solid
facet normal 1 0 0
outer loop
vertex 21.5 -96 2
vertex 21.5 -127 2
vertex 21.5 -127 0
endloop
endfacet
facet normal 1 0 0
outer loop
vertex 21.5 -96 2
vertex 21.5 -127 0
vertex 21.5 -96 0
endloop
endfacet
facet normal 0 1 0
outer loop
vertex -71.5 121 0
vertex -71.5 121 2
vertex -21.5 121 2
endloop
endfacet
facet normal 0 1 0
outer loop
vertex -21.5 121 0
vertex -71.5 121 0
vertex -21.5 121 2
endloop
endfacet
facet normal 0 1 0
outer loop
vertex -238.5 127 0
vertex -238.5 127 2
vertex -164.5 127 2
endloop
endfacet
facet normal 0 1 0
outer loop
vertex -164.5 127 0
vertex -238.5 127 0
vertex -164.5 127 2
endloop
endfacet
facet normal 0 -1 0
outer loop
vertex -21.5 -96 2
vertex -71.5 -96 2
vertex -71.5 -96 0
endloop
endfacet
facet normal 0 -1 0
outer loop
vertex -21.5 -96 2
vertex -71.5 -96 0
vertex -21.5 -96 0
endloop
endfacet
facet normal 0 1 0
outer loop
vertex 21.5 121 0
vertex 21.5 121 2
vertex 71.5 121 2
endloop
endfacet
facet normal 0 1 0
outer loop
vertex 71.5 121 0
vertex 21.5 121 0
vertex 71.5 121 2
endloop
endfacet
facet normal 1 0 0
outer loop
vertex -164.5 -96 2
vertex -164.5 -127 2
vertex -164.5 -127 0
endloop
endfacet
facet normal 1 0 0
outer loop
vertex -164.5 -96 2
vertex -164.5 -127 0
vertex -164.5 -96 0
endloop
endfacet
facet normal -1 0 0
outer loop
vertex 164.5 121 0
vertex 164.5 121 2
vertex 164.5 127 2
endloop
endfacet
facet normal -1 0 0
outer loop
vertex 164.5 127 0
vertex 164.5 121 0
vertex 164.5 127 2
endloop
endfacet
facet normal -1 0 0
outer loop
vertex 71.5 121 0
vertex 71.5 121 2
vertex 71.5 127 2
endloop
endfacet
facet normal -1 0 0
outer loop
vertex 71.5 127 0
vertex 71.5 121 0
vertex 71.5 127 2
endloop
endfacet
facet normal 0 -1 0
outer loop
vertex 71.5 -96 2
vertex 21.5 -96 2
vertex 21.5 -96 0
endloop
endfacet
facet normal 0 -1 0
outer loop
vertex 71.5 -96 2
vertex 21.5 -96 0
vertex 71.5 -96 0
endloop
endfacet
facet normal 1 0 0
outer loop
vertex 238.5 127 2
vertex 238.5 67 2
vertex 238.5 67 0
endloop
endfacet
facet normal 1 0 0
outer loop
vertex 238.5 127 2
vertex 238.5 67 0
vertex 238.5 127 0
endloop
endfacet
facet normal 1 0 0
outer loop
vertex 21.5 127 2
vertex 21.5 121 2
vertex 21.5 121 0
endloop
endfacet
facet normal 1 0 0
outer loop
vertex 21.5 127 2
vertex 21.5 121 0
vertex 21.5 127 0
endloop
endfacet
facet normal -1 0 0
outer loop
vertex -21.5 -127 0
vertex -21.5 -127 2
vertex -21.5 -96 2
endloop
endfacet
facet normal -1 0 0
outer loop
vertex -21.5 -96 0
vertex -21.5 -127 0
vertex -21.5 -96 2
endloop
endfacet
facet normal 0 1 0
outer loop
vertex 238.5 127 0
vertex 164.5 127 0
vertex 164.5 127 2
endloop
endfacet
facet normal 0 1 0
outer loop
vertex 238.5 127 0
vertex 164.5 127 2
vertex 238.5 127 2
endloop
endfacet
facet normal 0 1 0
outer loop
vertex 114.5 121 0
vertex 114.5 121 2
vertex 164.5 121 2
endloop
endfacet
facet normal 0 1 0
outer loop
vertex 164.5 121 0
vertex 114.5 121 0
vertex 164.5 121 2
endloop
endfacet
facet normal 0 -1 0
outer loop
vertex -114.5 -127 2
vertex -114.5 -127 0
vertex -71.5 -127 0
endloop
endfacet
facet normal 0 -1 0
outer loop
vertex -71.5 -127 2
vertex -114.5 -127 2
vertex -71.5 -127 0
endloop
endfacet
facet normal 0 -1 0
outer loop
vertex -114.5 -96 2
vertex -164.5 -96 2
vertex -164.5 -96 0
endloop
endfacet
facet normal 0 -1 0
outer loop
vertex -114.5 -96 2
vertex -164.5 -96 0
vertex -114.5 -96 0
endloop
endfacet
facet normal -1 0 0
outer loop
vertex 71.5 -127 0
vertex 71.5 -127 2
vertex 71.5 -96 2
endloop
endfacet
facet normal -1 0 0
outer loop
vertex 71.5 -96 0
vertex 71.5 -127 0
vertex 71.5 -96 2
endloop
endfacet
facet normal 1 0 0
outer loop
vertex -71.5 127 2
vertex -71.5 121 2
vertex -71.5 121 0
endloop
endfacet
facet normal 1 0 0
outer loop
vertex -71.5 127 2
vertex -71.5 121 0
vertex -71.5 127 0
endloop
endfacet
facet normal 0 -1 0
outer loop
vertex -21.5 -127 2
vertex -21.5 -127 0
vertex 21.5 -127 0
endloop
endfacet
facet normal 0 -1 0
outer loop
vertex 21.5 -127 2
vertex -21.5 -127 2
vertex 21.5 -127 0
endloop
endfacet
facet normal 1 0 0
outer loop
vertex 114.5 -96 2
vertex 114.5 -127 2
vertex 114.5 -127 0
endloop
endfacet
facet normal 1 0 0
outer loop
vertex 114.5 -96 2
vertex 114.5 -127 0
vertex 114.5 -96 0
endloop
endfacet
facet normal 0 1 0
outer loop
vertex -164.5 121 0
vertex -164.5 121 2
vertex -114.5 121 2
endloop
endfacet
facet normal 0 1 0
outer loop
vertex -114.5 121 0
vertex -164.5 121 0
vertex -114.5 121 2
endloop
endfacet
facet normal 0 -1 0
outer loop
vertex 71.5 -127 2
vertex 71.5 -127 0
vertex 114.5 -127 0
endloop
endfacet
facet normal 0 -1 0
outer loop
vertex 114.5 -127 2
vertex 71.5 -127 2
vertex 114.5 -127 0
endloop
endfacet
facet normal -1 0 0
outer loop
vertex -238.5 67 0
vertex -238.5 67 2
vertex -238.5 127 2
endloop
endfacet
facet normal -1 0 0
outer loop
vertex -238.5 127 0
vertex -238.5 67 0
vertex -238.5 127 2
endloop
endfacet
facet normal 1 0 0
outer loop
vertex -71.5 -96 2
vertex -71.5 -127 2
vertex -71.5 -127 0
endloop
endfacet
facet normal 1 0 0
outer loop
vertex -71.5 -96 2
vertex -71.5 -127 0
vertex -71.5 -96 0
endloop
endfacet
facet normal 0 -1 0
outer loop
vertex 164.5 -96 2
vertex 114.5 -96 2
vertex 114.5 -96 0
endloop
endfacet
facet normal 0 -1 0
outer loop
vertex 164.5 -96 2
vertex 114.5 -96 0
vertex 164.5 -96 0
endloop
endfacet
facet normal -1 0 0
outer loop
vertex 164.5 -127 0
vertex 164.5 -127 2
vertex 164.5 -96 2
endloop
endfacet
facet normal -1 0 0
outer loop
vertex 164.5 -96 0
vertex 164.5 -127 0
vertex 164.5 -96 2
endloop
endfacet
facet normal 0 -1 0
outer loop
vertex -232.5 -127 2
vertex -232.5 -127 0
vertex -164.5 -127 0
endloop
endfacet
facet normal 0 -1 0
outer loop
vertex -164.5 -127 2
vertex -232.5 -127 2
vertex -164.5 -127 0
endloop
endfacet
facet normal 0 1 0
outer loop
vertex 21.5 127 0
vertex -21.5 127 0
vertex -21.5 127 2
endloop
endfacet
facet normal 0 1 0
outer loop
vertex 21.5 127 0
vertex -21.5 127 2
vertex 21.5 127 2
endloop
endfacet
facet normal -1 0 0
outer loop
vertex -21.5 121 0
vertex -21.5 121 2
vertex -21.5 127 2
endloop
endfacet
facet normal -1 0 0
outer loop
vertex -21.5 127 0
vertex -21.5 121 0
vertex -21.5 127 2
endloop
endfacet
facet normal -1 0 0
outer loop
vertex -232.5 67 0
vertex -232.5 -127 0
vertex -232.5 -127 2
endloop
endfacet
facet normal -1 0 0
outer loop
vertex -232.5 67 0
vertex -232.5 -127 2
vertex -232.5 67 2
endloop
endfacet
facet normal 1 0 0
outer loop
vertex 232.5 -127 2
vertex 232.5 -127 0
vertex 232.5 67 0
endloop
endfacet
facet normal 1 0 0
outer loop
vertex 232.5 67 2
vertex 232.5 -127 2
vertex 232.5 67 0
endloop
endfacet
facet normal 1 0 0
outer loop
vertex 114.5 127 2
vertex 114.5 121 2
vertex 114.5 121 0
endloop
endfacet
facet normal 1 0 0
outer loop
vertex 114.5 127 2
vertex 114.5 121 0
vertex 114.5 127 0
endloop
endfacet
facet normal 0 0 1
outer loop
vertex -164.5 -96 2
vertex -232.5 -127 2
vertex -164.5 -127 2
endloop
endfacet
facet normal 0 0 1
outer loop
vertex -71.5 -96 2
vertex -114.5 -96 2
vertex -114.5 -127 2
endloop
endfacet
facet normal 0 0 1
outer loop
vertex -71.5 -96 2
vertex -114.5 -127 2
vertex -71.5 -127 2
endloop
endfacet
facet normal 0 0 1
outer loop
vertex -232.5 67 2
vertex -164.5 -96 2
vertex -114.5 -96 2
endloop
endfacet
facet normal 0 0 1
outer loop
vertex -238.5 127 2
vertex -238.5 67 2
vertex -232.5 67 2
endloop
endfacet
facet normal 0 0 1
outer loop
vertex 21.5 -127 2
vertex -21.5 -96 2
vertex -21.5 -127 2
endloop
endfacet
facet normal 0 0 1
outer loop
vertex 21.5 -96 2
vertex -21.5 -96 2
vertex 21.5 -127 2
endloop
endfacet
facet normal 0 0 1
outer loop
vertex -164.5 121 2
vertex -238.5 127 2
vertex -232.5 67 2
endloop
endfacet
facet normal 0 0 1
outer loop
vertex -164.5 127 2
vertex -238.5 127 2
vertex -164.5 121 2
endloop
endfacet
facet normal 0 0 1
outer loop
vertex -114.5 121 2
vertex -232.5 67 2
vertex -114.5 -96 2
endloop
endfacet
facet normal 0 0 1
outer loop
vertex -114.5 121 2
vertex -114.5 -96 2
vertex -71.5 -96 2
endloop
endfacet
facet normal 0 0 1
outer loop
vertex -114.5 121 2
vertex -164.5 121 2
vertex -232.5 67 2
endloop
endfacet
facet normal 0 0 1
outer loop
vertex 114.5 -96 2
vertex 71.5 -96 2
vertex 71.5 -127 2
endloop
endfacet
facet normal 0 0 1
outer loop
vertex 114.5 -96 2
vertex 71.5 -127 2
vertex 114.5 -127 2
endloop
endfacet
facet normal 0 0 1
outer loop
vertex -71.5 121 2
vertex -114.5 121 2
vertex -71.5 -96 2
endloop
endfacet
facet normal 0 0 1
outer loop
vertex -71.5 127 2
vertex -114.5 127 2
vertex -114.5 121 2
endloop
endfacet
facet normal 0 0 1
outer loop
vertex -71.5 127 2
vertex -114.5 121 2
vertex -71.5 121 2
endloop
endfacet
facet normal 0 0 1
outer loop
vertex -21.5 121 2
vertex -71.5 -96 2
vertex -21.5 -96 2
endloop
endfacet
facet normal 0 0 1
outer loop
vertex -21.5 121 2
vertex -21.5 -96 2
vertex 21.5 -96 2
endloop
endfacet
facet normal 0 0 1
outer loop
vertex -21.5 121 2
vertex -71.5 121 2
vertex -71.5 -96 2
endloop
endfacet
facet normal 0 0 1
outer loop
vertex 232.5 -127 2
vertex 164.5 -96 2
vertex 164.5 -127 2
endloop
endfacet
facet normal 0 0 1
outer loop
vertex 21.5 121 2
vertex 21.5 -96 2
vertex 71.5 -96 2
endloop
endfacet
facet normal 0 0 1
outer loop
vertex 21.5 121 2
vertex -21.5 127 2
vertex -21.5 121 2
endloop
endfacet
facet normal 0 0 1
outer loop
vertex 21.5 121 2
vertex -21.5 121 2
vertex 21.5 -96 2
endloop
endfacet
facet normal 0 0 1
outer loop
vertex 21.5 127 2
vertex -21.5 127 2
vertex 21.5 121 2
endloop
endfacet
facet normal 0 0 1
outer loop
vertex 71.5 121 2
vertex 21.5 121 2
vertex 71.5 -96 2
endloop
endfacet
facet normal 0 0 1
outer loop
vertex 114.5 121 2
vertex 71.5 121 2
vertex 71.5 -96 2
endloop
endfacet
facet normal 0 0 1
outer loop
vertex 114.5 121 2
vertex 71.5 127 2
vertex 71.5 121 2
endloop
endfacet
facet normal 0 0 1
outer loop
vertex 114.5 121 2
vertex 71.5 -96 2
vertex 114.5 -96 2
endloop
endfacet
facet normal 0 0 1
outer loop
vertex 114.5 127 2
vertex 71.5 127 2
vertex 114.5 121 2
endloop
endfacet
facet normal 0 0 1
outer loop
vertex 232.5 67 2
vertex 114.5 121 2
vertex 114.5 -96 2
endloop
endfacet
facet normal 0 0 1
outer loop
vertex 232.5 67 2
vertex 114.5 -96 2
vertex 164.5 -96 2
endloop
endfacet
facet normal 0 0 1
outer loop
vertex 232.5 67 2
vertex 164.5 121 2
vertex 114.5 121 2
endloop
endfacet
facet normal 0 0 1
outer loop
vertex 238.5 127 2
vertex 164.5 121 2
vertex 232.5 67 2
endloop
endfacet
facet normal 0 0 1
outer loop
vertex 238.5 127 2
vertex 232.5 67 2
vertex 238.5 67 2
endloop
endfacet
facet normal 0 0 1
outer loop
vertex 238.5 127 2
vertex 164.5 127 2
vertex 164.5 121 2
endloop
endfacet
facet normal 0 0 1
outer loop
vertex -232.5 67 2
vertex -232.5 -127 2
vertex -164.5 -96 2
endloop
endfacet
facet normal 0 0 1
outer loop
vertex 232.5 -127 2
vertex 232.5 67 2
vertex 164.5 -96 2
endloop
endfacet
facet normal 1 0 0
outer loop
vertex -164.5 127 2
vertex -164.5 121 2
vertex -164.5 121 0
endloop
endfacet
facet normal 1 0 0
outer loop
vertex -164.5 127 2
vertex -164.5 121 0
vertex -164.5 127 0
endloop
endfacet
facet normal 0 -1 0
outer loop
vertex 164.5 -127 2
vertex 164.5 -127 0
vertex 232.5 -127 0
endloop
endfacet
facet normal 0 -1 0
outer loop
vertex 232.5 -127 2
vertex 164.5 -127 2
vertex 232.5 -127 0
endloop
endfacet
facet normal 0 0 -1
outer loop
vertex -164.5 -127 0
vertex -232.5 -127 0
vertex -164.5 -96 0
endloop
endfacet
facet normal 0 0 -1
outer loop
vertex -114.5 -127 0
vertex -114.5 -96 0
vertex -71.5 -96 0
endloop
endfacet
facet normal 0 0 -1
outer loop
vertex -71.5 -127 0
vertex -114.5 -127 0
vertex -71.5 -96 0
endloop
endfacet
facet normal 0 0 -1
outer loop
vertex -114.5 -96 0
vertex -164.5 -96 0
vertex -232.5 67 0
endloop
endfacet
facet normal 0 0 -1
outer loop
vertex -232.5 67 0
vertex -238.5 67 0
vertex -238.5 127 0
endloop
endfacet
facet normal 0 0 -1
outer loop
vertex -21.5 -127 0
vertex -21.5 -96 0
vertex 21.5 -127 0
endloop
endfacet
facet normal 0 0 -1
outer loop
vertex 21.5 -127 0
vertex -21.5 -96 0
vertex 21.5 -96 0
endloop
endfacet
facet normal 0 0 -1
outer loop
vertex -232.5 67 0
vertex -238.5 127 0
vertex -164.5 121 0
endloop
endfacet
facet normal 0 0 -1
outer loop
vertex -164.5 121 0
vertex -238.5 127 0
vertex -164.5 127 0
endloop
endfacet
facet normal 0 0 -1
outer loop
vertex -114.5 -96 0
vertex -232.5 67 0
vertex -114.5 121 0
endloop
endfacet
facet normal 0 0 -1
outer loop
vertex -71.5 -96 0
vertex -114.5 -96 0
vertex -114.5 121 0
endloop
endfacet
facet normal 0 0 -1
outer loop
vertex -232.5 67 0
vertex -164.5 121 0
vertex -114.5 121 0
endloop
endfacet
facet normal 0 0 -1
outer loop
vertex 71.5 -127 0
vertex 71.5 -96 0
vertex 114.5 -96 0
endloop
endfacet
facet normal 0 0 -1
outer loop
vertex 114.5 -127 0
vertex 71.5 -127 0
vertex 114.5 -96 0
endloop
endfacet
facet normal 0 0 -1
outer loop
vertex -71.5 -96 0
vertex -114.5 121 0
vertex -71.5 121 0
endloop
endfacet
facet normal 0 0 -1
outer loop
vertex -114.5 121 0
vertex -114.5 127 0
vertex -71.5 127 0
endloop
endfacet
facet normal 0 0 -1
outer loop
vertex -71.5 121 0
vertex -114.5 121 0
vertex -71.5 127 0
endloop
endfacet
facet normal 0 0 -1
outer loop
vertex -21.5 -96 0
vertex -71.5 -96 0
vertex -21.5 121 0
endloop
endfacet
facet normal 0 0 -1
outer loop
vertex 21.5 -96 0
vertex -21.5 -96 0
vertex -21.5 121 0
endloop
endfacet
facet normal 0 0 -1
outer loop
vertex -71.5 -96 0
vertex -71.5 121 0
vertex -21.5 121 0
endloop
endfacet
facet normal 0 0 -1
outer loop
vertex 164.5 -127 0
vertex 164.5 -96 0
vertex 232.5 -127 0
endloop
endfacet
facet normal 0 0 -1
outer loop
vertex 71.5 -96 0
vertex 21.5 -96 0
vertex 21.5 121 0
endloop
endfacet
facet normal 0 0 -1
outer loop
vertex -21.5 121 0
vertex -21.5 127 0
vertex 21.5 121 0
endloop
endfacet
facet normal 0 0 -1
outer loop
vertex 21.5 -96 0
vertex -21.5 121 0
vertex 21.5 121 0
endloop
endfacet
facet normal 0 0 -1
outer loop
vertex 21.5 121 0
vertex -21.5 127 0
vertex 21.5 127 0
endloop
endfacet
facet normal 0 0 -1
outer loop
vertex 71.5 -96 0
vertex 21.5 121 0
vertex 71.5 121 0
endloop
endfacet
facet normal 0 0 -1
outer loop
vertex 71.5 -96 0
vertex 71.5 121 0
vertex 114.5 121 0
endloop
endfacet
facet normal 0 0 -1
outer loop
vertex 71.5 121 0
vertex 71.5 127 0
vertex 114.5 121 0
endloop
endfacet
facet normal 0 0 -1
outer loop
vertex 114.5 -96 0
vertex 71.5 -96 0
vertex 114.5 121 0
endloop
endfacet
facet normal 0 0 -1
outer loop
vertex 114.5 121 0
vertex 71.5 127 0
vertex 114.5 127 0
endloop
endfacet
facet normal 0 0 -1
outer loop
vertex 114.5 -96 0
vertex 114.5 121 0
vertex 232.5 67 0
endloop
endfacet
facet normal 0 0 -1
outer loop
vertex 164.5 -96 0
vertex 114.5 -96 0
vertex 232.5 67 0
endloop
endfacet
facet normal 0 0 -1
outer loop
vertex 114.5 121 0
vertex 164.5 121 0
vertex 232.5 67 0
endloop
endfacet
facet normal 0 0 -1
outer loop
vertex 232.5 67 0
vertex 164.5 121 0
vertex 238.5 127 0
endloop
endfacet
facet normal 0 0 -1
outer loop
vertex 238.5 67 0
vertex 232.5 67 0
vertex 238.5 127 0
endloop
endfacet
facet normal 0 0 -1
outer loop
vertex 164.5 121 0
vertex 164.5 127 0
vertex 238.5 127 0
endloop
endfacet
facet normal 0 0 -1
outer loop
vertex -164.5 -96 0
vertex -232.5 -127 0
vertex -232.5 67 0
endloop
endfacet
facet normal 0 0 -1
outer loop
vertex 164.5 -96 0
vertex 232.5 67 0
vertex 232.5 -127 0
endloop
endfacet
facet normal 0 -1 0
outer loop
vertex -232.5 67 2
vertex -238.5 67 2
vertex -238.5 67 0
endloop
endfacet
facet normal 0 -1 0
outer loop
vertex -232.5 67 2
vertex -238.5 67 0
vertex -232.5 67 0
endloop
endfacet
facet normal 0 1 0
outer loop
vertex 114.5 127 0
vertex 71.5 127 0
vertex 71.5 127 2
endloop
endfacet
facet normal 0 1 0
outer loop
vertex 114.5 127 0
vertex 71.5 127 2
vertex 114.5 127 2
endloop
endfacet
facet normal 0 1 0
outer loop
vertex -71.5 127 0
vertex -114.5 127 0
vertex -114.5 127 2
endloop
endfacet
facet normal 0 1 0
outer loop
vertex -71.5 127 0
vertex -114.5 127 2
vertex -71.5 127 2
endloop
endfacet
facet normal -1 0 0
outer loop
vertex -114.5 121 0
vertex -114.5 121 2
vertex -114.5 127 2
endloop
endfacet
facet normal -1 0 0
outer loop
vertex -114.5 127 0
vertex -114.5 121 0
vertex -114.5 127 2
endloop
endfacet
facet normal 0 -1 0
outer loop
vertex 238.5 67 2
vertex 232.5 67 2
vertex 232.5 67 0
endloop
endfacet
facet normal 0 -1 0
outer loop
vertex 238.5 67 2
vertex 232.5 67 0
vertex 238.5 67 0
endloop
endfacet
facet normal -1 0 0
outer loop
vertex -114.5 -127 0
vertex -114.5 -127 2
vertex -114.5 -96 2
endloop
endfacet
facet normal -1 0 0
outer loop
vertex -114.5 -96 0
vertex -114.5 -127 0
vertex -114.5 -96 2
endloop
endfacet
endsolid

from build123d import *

# Parameters (mm, degrees)
SKETCH1_W           = 465
SKETCH1_H           = 254
BOSS_EXTRUDE1_DEPTH = 2
SKETCH2_W           = 50
SKETCH2_H           = 12
CUT_EXTRUDE1_DEPTH  = 2
SKETCH3_W           = 6
SKETCH3_H           = 60
BOSS_EXTRUDE2_DEPTH = 2
SKETCH4_W           = 50
SKETCH4_H           = 25
CUT_EXTRUDE2_DEPTH  = 2


with BuildPart() as part:
    # Sketch1 → Boss-Extrude1 (new body)
    with BuildSketch(Plane.XY):
        Rectangle(SKETCH1_W, SKETCH1_H)
    extrude(amount=BOSS_EXTRUDE1_DEPTH)

    # Sketch2 → Cut-Extrude1 (cut)
    with BuildSketch(Plane.XY.offset(2)):
        with Locations((-139.5, -127)):
            Rectangle(SKETCH2_W, SKETCH2_H)
        with Locations((-46.5, -127)):
            Rectangle(SKETCH2_W, SKETCH2_H)
        with Locations((46.5, -127)):
            Rectangle(SKETCH2_W, SKETCH2_H)
        with Locations((139.5, -127)):
            Rectangle(SKETCH2_W, SKETCH2_H)
        with Locations((-139.5, 127)):
            Rectangle(SKETCH2_W, SKETCH2_H)
        with Locations((-46.5, 127)):
            Rectangle(SKETCH2_W, SKETCH2_H)
        with Locations((46.5, 127)):
            Rectangle(SKETCH2_W, SKETCH2_H)
        with Locations((139.5, 127)):
            Rectangle(SKETCH2_W, SKETCH2_H)
    extrude(amount=-CUT_EXTRUDE1_DEPTH, mode=Mode.SUBTRACT)

    # Sketch3 → Boss-Extrude2 (add)
    with BuildSketch(Plane.XY.offset(2)):
        with Locations((-235.5, 97)):
            Rectangle(SKETCH3_W, SKETCH3_H)
        with Locations((235.5, 97)):
            Rectangle(SKETCH3_W, SKETCH3_H)
    extrude(amount=-BOSS_EXTRUDE2_DEPTH)

    # Sketch4 → Cut-Extrude2 (cut)
    with BuildSketch(Plane.XY.offset(2)):
        with Locations((-139.5, -108.5)):
            Rectangle(SKETCH4_W, SKETCH4_H)
        with Locations((46.5, -108.5)):
            Rectangle(SKETCH4_W, SKETCH4_H)
        with Locations((139.5, -108.5)):
            Rectangle(SKETCH4_W, SKETCH4_H)
        with Locations((-46.5, -108.5)):
            Rectangle(SKETCH4_W, SKETCH4_H)
    extrude(amount=-CUT_EXTRUDE2_DEPTH, mode=Mode.SUBTRACT)


solid = part.part
